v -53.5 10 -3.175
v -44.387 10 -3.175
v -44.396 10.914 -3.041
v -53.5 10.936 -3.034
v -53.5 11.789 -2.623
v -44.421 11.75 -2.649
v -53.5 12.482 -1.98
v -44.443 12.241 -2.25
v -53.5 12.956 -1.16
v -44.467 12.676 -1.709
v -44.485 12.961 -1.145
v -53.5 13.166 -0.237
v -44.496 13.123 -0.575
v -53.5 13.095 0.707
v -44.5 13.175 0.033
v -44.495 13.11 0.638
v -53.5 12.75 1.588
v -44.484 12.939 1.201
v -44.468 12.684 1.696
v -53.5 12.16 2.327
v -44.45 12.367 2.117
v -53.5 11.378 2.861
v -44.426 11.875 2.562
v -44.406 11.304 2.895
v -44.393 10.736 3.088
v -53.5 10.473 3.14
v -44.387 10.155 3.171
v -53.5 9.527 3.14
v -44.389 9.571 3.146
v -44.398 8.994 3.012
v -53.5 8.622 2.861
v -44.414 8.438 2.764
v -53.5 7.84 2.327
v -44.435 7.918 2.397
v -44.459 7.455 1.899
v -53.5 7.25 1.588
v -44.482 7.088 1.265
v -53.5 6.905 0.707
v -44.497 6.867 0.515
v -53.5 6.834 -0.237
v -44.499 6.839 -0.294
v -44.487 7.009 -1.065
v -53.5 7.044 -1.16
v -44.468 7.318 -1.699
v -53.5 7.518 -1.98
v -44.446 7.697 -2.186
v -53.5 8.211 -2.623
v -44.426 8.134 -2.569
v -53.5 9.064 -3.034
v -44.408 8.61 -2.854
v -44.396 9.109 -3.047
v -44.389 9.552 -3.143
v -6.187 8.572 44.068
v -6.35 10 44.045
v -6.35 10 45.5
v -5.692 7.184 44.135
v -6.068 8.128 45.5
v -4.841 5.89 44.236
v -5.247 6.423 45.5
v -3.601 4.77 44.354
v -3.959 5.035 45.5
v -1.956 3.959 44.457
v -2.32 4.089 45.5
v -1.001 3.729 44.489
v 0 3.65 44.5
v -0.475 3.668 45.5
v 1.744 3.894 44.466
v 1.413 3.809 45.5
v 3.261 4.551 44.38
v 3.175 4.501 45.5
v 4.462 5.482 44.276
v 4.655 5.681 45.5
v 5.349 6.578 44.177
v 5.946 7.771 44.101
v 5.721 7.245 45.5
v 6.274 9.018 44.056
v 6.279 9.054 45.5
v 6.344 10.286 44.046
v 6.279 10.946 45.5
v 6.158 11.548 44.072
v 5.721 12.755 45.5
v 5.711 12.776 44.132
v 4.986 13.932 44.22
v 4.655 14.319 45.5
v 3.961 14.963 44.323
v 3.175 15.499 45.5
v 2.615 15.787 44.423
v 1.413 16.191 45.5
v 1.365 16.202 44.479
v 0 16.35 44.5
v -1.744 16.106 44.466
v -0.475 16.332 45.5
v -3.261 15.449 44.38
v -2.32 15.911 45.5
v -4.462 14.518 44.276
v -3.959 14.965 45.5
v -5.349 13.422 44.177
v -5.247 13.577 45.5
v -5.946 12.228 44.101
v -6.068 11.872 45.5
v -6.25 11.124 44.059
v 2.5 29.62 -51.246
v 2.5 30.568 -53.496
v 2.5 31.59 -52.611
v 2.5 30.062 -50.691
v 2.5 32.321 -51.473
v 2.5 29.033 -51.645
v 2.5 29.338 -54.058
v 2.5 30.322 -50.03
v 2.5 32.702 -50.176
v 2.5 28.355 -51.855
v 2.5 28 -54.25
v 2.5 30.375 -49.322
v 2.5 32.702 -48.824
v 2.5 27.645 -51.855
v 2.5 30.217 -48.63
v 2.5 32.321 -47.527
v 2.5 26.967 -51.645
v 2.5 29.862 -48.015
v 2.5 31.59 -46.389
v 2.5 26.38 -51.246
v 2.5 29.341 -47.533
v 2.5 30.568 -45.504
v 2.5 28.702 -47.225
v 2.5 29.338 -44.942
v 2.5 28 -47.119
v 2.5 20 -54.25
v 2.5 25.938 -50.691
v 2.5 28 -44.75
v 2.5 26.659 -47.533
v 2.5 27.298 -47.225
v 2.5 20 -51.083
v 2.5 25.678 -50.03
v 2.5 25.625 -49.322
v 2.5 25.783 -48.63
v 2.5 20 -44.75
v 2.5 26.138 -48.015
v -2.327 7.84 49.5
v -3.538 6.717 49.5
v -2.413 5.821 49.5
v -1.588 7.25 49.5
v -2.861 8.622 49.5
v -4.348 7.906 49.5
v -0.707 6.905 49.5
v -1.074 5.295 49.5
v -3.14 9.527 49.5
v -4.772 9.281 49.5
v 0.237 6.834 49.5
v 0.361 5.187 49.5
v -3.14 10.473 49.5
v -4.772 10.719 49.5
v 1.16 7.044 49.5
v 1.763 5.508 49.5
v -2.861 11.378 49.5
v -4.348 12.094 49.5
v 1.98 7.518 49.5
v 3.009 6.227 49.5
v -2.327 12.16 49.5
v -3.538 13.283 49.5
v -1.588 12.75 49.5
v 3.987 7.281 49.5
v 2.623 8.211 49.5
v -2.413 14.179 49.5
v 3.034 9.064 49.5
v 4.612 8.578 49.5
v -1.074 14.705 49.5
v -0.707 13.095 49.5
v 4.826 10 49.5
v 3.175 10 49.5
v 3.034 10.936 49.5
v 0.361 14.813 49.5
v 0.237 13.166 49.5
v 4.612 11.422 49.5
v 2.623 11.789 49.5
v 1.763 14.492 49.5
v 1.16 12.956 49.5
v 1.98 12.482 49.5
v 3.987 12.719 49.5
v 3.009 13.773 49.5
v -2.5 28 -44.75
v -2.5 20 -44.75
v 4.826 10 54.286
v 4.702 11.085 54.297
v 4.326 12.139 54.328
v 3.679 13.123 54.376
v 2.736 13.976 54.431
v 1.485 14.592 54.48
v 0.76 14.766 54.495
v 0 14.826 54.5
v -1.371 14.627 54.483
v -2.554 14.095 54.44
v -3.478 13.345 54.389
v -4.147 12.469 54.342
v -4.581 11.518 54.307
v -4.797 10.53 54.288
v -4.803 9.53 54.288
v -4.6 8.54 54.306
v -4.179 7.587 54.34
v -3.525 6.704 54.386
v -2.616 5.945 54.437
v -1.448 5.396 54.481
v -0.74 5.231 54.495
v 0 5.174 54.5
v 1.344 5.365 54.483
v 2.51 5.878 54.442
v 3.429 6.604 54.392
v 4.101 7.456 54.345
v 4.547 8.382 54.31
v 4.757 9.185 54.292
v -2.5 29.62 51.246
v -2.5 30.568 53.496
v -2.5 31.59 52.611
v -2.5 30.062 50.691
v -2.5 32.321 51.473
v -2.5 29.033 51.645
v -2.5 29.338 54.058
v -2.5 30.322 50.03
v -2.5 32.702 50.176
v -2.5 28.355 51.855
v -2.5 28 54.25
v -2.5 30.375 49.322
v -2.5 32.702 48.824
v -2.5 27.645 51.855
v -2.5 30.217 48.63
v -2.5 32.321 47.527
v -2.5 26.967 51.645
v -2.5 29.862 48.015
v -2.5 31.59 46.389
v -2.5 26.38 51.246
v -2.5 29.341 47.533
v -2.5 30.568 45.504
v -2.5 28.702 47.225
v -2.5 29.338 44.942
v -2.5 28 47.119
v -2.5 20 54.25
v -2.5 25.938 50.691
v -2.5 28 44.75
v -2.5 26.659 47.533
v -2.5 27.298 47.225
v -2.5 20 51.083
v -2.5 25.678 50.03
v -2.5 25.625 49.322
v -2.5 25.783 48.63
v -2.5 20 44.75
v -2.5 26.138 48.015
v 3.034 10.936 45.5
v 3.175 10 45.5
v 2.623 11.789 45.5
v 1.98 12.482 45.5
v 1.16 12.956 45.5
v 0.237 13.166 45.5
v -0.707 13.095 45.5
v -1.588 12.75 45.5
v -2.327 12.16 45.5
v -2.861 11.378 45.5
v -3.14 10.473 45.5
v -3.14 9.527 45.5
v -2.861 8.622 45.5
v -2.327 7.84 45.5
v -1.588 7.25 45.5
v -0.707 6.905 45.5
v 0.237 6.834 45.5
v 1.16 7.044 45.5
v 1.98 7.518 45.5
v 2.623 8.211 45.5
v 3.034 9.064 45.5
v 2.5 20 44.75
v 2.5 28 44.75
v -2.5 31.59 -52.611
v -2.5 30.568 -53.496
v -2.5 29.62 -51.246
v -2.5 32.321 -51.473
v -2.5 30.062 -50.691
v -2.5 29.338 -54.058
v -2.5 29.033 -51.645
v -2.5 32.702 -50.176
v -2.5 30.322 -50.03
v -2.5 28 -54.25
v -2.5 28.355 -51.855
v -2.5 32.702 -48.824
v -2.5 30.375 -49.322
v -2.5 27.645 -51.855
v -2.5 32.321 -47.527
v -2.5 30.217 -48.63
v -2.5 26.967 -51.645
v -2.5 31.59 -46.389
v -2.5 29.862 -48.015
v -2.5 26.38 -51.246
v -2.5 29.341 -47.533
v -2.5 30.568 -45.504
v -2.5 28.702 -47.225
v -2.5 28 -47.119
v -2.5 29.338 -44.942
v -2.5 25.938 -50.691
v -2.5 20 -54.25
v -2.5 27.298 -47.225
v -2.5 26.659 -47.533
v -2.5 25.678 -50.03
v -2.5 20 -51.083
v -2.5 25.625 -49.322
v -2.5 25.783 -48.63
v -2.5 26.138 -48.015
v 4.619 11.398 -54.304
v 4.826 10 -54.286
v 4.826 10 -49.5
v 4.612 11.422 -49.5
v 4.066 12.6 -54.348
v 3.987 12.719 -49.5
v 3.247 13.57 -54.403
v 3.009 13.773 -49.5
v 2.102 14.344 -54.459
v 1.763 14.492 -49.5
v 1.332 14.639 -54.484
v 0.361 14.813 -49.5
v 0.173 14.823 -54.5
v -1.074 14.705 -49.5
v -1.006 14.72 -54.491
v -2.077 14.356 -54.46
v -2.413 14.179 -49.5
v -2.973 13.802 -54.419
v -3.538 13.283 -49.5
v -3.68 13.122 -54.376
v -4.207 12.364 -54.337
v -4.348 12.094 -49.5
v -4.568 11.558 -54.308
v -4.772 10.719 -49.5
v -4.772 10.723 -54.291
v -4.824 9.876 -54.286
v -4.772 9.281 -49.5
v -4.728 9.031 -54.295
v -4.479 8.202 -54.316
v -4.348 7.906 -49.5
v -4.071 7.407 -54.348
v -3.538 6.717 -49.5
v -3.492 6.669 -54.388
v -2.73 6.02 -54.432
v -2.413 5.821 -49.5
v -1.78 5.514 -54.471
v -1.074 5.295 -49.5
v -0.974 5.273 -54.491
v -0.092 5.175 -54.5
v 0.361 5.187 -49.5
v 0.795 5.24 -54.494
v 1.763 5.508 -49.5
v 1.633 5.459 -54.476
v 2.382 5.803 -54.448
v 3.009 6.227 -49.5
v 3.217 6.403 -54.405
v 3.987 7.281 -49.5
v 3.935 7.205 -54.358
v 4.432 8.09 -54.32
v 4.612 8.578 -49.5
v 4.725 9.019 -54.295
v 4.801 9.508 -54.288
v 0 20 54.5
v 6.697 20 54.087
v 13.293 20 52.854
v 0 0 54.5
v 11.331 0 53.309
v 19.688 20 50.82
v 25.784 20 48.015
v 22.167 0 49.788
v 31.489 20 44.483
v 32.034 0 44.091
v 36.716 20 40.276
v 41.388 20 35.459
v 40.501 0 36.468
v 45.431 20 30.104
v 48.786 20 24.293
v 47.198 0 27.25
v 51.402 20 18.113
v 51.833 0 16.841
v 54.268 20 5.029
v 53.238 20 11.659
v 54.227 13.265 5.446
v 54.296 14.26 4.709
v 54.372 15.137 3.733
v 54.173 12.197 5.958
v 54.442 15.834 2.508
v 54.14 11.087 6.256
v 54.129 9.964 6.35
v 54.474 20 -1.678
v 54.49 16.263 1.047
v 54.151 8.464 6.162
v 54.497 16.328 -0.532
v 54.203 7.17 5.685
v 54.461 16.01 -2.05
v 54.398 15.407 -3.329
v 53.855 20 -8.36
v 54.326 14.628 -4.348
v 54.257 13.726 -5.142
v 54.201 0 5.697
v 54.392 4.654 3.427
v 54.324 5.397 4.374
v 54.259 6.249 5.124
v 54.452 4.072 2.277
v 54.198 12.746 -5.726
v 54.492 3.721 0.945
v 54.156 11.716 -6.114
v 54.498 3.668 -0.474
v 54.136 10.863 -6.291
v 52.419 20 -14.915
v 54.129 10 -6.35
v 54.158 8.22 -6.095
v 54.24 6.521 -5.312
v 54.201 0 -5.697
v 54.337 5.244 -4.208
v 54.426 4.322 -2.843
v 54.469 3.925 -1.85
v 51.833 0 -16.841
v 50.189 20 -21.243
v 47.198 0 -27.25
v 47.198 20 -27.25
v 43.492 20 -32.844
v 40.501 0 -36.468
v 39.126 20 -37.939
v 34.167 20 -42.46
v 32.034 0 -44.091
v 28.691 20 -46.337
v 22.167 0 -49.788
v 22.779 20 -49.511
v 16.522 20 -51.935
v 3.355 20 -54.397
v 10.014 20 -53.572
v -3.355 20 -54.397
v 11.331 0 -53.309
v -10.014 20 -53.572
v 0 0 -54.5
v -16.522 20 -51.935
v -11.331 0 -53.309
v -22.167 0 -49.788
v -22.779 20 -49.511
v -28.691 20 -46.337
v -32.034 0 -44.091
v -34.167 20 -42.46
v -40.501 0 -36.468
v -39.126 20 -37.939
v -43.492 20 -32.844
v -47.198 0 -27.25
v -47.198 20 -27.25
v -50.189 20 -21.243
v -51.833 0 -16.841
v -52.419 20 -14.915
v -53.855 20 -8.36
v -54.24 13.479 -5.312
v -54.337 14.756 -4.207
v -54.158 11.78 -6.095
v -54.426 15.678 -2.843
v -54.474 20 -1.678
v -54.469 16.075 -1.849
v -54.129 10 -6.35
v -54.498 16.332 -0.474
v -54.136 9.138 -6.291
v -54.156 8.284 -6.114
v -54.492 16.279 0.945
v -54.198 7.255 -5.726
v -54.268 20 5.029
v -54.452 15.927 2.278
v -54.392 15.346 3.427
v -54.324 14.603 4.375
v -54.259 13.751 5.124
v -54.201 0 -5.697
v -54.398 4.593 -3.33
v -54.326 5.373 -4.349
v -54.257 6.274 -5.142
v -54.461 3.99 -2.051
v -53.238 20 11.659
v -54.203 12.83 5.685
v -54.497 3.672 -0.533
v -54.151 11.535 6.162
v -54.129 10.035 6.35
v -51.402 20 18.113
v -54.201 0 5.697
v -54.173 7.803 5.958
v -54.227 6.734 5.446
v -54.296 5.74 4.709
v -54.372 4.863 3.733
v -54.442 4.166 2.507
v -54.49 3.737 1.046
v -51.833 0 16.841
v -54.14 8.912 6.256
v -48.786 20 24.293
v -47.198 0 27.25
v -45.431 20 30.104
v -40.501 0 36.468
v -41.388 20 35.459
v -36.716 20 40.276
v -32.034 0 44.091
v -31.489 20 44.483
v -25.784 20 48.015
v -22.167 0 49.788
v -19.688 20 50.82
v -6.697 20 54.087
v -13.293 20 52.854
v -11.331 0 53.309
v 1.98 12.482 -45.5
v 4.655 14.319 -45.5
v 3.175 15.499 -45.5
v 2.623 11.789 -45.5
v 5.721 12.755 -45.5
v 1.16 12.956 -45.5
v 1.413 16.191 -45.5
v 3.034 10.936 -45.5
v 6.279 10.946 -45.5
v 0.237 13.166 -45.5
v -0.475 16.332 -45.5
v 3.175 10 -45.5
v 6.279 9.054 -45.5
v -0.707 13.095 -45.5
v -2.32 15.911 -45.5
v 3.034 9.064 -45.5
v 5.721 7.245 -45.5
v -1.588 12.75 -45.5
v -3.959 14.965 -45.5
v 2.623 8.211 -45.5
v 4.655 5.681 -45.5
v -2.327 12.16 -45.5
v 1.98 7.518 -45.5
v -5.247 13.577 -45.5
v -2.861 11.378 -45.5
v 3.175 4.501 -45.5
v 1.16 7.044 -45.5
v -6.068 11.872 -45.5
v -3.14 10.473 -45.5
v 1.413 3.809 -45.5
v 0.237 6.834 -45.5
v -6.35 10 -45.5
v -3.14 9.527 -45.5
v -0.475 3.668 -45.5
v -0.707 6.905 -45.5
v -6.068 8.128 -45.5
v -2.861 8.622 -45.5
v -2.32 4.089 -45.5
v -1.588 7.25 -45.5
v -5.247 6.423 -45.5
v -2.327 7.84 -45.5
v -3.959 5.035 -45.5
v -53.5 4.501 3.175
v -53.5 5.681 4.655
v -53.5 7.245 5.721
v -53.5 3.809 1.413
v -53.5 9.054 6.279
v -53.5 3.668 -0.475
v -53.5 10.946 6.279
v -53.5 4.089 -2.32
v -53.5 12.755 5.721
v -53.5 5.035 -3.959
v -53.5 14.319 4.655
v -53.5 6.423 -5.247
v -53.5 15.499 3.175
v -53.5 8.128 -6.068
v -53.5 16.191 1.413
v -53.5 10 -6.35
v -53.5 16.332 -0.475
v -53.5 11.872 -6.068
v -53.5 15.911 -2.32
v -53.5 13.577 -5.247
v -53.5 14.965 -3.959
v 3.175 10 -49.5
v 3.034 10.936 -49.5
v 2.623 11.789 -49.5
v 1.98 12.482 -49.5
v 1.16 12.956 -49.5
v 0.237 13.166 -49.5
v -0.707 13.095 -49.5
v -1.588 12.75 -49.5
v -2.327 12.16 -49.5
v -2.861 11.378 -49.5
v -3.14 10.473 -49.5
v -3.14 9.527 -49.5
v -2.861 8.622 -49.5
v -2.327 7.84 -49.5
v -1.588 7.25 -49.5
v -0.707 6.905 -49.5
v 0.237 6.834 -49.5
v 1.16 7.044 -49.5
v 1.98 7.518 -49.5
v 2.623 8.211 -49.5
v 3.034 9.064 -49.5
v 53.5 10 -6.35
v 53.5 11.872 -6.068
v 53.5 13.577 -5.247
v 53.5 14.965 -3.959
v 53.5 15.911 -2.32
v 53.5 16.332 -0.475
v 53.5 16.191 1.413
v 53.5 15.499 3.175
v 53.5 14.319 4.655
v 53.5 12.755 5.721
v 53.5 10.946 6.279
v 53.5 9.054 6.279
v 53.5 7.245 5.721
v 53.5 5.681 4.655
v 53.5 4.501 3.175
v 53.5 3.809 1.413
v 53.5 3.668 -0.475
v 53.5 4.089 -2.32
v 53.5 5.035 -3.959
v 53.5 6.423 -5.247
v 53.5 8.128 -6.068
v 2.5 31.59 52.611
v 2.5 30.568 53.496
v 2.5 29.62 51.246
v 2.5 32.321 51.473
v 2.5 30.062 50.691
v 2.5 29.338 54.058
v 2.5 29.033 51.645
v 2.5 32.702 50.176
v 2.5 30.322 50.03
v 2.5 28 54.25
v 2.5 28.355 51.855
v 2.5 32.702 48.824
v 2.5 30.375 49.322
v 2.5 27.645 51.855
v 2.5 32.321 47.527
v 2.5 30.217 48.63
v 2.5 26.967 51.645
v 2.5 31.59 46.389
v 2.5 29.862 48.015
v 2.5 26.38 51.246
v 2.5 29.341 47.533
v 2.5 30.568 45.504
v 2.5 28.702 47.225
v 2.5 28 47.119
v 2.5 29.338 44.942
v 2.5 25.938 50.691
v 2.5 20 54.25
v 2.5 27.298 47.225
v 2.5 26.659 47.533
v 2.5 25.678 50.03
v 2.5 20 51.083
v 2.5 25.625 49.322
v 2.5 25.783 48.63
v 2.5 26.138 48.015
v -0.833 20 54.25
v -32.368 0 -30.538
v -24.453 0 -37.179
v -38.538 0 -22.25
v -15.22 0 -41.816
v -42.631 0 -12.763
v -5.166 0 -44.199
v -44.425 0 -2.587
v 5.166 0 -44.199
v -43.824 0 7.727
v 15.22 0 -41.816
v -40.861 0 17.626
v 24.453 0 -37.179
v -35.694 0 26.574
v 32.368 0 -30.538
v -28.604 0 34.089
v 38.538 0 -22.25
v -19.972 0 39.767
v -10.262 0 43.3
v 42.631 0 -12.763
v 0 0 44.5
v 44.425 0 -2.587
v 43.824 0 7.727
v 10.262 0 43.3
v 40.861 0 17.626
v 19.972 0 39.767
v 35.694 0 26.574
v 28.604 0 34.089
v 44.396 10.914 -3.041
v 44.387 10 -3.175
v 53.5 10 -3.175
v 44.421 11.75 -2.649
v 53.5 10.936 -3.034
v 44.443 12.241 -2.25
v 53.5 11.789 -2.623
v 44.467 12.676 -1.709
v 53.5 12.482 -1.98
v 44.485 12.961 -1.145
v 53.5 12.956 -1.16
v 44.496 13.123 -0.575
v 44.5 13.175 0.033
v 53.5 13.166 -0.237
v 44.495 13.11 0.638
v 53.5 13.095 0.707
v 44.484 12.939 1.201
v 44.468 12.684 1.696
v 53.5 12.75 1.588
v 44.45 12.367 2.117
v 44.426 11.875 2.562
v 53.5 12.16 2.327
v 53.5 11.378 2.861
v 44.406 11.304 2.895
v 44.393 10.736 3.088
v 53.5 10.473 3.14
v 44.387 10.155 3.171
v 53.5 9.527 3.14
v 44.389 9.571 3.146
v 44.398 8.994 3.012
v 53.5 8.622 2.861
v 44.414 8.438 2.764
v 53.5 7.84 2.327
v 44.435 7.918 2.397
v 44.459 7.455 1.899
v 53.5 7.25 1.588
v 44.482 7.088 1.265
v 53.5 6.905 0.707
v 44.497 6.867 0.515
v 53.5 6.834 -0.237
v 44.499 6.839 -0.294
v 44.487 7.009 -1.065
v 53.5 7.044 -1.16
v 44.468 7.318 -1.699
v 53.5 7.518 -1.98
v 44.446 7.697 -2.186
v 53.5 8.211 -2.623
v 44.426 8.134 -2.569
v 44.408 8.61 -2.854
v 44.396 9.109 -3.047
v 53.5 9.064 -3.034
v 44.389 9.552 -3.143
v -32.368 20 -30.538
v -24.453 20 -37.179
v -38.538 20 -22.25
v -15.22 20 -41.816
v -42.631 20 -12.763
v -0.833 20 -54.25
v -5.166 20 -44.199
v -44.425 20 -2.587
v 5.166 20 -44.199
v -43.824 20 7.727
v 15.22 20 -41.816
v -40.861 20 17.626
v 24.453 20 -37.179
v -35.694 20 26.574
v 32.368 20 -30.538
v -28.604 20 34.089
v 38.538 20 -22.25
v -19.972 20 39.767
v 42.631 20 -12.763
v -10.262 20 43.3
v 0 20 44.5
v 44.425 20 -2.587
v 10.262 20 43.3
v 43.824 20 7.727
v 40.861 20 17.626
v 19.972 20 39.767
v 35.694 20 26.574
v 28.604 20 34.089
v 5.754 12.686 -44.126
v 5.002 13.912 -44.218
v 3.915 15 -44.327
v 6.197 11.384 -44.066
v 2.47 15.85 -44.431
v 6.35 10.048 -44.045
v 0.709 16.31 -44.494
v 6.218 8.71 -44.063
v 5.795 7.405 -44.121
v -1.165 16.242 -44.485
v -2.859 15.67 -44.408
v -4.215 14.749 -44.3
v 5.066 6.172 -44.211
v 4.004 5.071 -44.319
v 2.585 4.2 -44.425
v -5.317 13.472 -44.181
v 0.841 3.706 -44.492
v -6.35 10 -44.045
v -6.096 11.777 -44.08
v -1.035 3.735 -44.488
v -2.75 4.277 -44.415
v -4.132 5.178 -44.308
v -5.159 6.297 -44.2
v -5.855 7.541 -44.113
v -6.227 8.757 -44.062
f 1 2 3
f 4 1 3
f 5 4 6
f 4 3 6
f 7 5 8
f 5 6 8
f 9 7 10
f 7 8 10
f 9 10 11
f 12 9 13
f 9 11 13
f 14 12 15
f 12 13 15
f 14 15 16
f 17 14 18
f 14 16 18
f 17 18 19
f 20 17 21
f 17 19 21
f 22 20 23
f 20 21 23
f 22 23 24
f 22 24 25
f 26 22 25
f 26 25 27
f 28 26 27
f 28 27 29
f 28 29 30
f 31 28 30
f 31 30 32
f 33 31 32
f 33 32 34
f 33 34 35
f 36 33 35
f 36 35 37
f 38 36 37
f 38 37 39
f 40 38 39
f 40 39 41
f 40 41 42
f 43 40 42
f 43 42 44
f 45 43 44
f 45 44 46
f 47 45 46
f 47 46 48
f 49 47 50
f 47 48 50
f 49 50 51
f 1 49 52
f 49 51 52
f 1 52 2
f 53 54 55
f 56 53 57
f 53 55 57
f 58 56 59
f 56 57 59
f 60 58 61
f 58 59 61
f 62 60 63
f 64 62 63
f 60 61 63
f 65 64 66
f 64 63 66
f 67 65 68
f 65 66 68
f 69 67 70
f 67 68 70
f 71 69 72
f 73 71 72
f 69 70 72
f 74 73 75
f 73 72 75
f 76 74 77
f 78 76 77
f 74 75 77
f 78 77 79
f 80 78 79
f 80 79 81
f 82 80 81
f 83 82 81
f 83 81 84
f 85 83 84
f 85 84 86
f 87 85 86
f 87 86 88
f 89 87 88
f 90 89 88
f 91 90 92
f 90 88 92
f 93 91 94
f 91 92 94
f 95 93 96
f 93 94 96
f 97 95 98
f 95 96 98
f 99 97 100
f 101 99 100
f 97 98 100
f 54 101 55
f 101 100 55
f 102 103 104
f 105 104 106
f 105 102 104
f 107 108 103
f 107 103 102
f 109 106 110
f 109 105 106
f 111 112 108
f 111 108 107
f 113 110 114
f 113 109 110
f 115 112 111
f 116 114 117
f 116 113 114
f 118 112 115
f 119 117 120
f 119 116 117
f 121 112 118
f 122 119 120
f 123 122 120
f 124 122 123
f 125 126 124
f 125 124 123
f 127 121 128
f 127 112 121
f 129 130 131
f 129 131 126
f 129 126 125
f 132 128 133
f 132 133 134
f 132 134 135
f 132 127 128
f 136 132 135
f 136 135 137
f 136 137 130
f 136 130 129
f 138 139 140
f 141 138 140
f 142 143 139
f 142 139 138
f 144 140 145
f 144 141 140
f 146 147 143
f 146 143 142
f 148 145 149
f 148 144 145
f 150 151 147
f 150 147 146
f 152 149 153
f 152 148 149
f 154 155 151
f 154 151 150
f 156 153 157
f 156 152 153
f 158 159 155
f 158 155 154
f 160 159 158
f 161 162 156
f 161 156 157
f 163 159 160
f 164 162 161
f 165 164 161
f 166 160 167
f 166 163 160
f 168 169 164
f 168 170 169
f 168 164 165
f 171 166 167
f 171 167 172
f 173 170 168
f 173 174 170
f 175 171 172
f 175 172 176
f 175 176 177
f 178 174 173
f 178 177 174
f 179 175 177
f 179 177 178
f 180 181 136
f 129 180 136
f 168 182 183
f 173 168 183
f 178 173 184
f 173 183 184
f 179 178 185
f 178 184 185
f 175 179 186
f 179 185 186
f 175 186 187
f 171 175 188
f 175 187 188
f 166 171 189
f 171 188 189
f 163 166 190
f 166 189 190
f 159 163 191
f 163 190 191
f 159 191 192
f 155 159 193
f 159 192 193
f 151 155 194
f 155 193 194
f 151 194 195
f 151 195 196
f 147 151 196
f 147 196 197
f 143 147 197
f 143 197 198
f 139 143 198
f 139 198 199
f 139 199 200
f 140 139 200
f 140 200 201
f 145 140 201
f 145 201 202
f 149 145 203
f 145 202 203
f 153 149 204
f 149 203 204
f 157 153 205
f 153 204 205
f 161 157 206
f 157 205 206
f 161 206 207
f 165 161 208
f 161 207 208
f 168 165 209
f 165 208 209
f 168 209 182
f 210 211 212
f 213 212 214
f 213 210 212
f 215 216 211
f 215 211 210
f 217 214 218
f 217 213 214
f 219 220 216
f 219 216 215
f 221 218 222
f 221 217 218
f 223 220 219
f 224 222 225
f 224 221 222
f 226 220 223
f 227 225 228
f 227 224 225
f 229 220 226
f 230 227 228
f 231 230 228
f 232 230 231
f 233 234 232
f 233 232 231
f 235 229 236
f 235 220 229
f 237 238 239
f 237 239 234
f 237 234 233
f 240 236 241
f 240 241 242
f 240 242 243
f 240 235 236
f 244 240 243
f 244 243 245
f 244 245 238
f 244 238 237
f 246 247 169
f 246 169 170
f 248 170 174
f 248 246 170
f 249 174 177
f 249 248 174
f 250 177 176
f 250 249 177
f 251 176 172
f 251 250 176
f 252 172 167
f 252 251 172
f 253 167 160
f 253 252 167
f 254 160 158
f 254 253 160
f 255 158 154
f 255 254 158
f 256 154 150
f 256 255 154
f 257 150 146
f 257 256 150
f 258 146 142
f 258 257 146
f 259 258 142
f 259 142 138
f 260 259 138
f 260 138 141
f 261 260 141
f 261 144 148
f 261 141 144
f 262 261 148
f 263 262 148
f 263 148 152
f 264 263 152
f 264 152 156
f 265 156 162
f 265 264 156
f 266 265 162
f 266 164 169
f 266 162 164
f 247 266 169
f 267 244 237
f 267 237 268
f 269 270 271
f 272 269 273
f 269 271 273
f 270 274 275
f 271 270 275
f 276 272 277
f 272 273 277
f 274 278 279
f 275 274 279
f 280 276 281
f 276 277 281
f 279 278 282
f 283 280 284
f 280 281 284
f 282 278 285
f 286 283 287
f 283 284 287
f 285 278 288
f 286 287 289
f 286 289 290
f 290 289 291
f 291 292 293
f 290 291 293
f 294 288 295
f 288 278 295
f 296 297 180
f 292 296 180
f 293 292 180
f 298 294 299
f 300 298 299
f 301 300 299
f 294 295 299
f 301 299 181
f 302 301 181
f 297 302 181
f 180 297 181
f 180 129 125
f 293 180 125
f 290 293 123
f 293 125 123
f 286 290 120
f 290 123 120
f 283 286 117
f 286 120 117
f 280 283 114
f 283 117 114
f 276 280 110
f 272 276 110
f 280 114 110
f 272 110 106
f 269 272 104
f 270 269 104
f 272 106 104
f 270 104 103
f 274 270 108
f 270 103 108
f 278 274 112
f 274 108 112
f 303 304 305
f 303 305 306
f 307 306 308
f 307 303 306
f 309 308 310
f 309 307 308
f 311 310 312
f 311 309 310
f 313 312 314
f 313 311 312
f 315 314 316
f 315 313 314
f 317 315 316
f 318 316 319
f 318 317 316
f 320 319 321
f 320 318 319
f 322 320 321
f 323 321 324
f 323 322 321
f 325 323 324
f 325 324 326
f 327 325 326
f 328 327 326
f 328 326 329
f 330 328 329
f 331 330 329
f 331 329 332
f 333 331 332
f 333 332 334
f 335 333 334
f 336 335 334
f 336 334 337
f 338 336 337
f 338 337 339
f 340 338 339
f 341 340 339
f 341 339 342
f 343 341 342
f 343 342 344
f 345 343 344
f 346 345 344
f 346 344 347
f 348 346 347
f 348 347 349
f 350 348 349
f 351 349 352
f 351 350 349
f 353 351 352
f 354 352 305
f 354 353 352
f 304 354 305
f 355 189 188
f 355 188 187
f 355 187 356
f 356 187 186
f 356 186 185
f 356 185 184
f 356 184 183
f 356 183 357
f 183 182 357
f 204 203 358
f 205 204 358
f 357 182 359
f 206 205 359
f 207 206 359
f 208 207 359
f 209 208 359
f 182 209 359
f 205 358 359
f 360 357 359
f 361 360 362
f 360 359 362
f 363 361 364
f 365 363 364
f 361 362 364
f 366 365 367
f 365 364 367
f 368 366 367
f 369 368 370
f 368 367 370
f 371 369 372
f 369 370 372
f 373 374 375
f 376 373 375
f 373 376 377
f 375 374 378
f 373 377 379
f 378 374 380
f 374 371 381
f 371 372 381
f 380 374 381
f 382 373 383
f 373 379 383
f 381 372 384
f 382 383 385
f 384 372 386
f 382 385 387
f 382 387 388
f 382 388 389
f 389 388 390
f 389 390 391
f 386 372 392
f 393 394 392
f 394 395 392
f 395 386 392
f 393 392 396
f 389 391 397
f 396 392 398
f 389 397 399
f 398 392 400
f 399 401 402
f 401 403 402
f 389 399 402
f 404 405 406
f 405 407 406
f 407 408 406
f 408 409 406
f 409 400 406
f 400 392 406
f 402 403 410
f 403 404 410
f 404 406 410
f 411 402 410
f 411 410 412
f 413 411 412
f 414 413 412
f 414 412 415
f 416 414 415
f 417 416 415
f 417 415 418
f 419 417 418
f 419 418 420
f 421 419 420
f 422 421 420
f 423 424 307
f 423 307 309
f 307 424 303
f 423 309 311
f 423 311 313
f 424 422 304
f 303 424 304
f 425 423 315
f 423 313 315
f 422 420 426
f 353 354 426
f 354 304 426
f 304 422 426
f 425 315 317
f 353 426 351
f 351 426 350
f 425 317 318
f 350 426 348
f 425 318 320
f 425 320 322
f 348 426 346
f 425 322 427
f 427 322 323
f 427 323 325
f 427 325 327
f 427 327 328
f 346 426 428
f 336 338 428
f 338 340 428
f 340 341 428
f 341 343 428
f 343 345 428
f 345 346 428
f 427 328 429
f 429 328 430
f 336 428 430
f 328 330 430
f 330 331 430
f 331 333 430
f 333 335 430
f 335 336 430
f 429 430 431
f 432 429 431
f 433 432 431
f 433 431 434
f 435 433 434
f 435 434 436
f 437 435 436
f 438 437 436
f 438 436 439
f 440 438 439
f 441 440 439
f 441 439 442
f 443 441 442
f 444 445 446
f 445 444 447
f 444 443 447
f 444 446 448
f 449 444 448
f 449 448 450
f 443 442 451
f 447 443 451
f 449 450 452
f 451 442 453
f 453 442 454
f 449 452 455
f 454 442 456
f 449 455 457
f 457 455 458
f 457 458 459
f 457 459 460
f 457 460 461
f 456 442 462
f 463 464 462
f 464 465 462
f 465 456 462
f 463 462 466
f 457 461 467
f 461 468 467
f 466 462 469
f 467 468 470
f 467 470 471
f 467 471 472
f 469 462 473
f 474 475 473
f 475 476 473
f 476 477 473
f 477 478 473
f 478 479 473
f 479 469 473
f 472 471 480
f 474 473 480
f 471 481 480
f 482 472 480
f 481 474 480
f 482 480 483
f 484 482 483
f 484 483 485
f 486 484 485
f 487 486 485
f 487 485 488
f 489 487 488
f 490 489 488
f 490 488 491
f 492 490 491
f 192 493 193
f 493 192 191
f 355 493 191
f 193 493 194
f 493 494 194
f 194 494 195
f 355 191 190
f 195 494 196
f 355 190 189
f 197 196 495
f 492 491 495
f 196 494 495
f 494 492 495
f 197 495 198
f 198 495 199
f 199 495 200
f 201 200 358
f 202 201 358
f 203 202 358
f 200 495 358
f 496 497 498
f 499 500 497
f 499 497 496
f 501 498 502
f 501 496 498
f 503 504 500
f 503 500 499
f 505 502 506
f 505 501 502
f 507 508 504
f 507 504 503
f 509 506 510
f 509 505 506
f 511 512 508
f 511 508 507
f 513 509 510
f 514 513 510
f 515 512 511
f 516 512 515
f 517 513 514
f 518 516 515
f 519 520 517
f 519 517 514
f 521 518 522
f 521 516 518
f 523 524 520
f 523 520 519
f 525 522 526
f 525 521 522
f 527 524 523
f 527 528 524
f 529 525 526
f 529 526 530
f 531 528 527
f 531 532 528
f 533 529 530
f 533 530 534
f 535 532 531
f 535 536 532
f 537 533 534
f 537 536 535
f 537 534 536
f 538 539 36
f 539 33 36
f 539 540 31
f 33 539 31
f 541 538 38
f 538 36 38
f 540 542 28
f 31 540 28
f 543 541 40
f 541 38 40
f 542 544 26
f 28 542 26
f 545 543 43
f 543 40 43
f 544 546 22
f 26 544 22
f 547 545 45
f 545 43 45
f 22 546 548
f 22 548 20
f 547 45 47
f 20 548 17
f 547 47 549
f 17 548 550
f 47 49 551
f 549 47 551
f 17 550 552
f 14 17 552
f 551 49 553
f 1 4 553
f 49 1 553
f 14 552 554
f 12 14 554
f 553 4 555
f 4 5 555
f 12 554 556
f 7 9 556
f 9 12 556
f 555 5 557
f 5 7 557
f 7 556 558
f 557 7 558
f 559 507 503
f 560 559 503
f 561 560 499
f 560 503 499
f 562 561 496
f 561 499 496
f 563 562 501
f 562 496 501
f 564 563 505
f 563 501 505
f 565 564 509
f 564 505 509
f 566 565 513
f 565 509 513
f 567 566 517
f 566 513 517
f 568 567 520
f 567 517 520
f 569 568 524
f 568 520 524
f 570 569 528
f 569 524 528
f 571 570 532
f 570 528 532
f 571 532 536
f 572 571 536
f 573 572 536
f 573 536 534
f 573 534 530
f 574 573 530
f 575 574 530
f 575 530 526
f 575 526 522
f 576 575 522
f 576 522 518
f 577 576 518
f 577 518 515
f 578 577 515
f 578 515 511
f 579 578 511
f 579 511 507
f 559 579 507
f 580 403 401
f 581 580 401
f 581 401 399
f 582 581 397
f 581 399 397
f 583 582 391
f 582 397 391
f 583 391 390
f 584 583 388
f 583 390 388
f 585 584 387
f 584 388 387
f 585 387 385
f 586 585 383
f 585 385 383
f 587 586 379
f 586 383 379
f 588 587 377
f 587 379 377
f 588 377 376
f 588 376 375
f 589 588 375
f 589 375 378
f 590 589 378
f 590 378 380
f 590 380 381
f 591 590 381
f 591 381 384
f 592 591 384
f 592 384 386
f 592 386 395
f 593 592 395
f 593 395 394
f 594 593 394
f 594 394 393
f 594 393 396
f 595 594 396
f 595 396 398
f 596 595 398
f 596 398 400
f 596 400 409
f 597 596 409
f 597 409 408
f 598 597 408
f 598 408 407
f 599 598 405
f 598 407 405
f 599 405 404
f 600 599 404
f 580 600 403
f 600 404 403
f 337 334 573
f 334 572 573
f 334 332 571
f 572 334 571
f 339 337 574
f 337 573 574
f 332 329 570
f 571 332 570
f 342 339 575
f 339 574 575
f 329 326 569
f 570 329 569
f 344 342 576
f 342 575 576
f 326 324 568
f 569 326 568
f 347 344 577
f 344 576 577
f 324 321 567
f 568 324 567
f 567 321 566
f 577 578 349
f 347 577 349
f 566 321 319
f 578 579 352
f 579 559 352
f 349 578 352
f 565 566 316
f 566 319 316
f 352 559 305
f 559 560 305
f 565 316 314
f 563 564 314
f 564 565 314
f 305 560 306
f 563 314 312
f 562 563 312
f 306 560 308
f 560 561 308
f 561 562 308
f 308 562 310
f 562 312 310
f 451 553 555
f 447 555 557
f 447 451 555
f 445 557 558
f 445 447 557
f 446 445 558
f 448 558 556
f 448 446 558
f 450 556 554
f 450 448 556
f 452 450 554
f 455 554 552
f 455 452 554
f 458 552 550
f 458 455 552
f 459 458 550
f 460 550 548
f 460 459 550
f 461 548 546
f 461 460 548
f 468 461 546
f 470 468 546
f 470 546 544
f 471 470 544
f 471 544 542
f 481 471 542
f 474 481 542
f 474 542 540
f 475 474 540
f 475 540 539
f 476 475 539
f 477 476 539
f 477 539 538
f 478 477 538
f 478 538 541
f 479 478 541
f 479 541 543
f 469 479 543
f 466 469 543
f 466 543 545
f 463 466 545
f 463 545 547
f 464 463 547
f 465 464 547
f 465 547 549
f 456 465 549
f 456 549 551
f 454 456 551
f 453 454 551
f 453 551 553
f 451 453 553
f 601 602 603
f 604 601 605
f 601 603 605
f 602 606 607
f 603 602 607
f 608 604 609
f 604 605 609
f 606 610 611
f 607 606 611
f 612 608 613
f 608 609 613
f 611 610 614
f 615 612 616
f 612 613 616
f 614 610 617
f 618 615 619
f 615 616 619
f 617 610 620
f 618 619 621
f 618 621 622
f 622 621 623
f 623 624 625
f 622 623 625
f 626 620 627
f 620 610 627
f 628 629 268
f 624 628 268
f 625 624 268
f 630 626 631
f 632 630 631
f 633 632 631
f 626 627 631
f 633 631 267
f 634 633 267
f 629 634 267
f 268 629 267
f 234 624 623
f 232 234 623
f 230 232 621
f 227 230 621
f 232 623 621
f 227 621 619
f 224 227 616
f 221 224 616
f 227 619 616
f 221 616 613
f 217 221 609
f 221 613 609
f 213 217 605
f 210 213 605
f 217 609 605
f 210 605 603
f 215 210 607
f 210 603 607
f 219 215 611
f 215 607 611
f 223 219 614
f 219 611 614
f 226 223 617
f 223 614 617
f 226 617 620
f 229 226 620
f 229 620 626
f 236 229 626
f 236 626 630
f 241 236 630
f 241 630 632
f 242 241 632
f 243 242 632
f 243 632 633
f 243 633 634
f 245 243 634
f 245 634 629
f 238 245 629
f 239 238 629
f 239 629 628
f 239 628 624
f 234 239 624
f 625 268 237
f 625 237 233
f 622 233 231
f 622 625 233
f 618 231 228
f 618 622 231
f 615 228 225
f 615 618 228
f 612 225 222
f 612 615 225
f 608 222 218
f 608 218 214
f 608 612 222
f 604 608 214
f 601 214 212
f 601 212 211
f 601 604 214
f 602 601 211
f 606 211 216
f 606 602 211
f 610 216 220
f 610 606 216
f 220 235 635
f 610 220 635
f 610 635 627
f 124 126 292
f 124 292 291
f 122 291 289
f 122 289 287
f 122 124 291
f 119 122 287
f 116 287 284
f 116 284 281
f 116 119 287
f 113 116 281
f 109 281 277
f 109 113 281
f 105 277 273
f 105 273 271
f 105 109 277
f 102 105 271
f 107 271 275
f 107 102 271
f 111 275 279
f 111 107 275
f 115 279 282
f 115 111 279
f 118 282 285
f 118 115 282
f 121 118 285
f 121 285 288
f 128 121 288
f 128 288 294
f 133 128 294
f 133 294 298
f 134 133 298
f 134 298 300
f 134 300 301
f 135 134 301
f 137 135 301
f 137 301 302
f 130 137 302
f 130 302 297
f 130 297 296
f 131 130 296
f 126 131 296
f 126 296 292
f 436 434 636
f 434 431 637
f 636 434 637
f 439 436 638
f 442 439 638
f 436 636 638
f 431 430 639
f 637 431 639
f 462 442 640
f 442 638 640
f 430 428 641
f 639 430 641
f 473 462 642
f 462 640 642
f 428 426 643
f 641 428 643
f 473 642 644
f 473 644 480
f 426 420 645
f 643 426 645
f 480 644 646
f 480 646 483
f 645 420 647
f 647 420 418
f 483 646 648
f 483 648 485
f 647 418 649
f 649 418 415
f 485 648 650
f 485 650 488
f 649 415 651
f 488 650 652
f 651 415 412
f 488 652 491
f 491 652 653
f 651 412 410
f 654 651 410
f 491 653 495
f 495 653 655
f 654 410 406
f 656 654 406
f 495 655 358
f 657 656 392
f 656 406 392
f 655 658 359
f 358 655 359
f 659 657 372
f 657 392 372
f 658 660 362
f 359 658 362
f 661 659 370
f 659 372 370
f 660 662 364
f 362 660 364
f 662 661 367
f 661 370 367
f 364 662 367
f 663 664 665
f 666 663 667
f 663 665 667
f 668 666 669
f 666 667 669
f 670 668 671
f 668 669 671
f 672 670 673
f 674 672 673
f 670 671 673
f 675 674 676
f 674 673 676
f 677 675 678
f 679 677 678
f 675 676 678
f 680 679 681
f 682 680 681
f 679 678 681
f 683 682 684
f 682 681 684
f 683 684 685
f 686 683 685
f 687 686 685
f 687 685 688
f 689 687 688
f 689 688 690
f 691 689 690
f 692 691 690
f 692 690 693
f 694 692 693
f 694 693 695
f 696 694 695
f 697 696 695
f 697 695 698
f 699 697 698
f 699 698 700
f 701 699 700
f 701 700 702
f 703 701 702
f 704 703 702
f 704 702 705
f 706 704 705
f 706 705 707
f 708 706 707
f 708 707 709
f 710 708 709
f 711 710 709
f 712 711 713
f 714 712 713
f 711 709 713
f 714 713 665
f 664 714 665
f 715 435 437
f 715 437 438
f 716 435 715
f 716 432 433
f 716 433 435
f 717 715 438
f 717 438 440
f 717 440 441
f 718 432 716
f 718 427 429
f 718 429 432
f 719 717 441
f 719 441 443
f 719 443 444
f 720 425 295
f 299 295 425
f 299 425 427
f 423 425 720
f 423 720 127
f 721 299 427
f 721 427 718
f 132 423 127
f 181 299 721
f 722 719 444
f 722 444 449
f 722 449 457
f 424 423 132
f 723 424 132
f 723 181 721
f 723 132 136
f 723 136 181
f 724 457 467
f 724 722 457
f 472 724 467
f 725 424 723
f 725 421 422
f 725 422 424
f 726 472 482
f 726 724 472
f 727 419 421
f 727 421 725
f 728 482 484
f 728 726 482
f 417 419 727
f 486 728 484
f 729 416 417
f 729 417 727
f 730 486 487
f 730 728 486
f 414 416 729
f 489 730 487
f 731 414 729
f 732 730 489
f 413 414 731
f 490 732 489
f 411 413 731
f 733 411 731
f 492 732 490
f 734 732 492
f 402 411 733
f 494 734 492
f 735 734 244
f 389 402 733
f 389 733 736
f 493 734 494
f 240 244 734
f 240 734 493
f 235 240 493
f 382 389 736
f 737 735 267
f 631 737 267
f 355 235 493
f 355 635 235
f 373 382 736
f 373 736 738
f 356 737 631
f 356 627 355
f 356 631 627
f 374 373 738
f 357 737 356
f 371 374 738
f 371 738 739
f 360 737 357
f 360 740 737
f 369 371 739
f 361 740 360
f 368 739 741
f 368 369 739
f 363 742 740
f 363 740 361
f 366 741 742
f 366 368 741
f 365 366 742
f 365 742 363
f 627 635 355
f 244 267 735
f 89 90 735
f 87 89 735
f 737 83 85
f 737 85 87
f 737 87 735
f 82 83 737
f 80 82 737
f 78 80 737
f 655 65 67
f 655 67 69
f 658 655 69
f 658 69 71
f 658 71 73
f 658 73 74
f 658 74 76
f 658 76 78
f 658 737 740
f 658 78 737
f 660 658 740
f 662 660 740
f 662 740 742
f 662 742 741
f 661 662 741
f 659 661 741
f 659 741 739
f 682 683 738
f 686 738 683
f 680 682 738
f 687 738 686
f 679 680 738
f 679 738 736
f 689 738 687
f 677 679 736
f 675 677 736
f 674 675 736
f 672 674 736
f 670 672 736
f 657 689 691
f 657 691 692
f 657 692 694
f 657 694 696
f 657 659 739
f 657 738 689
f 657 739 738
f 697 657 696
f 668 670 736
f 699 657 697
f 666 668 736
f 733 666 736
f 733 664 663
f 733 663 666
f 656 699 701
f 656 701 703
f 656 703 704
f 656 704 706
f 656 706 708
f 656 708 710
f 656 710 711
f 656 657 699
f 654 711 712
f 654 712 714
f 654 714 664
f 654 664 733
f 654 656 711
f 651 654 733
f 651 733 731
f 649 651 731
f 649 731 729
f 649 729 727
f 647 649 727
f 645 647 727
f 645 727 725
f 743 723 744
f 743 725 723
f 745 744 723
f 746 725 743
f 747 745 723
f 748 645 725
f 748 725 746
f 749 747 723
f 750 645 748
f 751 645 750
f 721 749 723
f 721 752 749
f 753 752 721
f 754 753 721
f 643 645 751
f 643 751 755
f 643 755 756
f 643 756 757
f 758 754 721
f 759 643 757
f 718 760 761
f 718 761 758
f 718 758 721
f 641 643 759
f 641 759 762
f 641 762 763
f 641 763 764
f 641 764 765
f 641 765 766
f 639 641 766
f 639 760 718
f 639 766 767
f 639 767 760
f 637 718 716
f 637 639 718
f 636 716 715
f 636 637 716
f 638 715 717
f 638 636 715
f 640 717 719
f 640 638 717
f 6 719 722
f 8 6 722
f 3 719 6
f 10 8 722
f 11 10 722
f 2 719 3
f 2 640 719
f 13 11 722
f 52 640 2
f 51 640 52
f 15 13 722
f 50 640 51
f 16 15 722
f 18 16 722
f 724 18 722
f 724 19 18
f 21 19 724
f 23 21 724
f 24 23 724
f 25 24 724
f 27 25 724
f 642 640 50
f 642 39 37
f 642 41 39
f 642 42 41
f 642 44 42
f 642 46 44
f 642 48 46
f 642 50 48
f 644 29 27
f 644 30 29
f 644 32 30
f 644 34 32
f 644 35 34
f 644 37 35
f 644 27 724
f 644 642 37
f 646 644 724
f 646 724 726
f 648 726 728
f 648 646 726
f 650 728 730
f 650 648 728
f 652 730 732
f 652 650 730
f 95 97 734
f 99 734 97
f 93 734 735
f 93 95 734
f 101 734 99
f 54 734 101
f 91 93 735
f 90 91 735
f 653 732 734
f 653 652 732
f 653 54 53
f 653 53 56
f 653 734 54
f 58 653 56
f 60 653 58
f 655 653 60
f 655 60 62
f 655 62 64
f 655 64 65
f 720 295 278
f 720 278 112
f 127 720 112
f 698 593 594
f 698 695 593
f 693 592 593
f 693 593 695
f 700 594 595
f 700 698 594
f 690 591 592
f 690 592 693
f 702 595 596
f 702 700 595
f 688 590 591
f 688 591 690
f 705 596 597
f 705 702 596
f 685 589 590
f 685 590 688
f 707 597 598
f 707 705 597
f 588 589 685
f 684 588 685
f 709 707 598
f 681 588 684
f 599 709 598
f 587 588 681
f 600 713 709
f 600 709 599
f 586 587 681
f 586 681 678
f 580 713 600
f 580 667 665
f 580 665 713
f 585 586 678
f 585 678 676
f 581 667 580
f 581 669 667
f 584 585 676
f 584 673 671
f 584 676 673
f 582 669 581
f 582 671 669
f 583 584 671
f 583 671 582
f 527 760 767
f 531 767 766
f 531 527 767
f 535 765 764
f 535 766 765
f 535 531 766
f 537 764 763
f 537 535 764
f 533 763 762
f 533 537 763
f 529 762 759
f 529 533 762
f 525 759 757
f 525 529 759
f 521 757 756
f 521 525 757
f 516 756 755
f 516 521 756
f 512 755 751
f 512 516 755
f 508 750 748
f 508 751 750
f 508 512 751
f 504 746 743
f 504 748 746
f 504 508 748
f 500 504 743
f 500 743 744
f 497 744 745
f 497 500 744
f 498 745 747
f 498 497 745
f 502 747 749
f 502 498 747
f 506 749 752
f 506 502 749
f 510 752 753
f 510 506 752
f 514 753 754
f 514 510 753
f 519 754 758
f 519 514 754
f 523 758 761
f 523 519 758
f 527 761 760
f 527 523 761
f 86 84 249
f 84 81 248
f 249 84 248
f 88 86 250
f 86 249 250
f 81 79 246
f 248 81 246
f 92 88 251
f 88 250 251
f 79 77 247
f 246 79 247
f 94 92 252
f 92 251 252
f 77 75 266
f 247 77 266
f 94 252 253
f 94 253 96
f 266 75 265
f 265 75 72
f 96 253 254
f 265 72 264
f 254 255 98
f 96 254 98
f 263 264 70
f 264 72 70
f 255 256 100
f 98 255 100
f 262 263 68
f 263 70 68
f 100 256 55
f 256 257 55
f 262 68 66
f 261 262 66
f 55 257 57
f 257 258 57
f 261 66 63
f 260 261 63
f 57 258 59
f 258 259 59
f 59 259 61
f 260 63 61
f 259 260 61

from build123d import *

# Parameters (mm, degrees)
SKETCH1_R               = 54.5
SKETCH1_R_2             = 44.5
BOSS_EXTRUDE1_DEPTH     = 20
CUT_EXTRUDE1_REACH      = 81.627
CUT_EXTRUDE1_END_RADIUS = 54.5
SKETCH2_R               = 3.175
CUT_EXTRUDE2_REACH      = 81.627
CUT_EXTRUDE2_END_RADIUS = 54.5
SKETCH2_2_R             = 3.175
SKETCH3_W               = 5
SKETCH3_H               = 9.5
BOSS_EXTRUDE2_DEPTH     = 13
CUT_EXTRUDE3_REACH      = 87.488
CUT_EXTRUDE4_REACH      = 87.392
SKETCH5_R               = 2.38125
SKETCH6_R               = 3.175
CUT_EXTRUDE5_DEPTH      = 180
SKETCH8_R               = 4.826
CUT_EXTRUDE6_DEPTH      = 5
SKETCH9_R               = 6.35
CUT_EXTRUDE7_DEPTH      = 1
SKETCH10_R              = 6.35
CUT_EXTRUDE9_DEPTH      = 1


with BuildPart() as part:
    # Sketch1 → Boss-Extrude1 (new body)
    with BuildSketch(Plane(origin=(0, 0, 0), x_dir=(1, 0, 0), z_dir=(0, 1, 0))):
        with Locations(Location((0, 0, 0), (0, 0, 270))):
            Circle(SKETCH1_R)
        with Locations(Location((0, 0, 0), (0, 0, 270))):
            Circle(SKETCH1_R_2, mode=Mode.SUBTRACT)
    extrude(amount=BOSS_EXTRUDE1_DEPTH)

    # Cut-Extrude1: up to this cylinder (the profile starts inside it)
    cut_extrude1_end = Plane(origin=(0, 10, 0), z_dir=(0, -1, 0)) * Cylinder(CUT_EXTRUDE1_END_RADIUS, 273.254, mode=Mode.PRIVATE)
    # Sketch2 → Cut-Extrude1 (cut, up to the surface)
    with BuildSketch(Plane.XY, mode=Mode.PRIVATE) as cut_extrude1_sk1:
        with Locations((0, 10)):
            Circle(SKETCH2_R)
    cut_extrude1_tool1 = extrude(cut_extrude1_sk1.sketch, amount=-CUT_EXTRUDE1_REACH, mode=Mode.PRIVATE) & cut_extrude1_end
    add(cut_extrude1_tool1.solids().sort_by_distance((0, 10, 0))[0], mode=Mode.SUBTRACT)

    # Cut-Extrude2: up to this cylinder (the profile starts inside it)
    cut_extrude2_end = Plane(origin=(0, 10, 0), z_dir=(0, -1, 0)) * Cylinder(CUT_EXTRUDE2_END_RADIUS, 273.254, mode=Mode.PRIVATE)
    # Sketch2_2 → Cut-Extrude2 (cut, up to the surface)
    with BuildSketch(Plane.XY, mode=Mode.PRIVATE) as cut_extrude2_sk1:
        with Locations((0, 10)):
            Circle(SKETCH2_2_R)
    cut_extrude2_tool1 = extrude(cut_extrude2_sk1.sketch, amount=CUT_EXTRUDE2_REACH, mode=Mode.PRIVATE) & cut_extrude2_end
    add(cut_extrude2_tool1.solids().sort_by_distance((0, 10, 0))[0], mode=Mode.SUBTRACT)

    # Sketch3 → Boss-Extrude2 (add)
    with BuildSketch(Plane(origin=(0, 20, 0), x_dir=(1, 0, 0), z_dir=(0, 1, 0))):
        with Locations((0, -49.5)):
            Rectangle(SKETCH3_W, SKETCH3_H)
    boss_extrude2 = extrude(amount=BOSS_EXTRUDE2_DEPTH)

    # Sketch4 → Cut-Extrude3 (cut, up to next)
    with BuildSketch(Plane(origin=(2.5, 0, 0), x_dir=(0, 0, -1), z_dir=(1, 0, 0)), mode=Mode.PRIVATE) as cut_extrude3_sk1:
        with BuildLine():
            Line((-54.25, 28), (-54.25, 33))
            Line((-54.25, 33), (-44.75, 33))
            Line((-44.75, 33), (-44.75, 28))
            ThreePointArc((-44.75, 28), (-49.5, 32.75), (-54.25, 28))
        make_face()
    cut_extrude3_tool1 = extrude(cut_extrude3_sk1.sketch, amount=-CUT_EXTRUDE3_REACH, mode=Mode.PRIVATE) & part.part
    cut_extrude3 = cut_extrude3_tool1.solids().sort_by_distance((2.5, 32.857355, 49.5))[0]
    add(cut_extrude3, mode=Mode.SUBTRACT)

    # Sketch5 → Cut-Extrude4 (cut, up to next)
    with BuildSketch(Plane(origin=(2.5, 0, 0), x_dir=(0, 0, -1), z_dir=(1, 0, 0)), mode=Mode.PRIVATE) as cut_extrude4_sk1:
        with Locations((-49.5, 28)):
            Circle(SKETCH5_R)
    cut_extrude4_tool1 = extrude(cut_extrude4_sk1.sketch, amount=-CUT_EXTRUDE4_REACH, mode=Mode.PRIVATE) & part.part
    cut_extrude4 = cut_extrude4_tool1.solids().sort_by_distance((2.5, 28, 49.5))[0]
    add(cut_extrude4, mode=Mode.SUBTRACT)

    # Mirror1: Boss-Extrude2, Cut-Extrude3, Cut-Extrude4 across plane
    add(boss_extrude2.mirror(Plane.XY))
    add(cut_extrude3.mirror(Plane.XY), mode=Mode.SUBTRACT)
    add(cut_extrude4.mirror(Plane.XY), mode=Mode.SUBTRACT)

    # Sketch6 → Cut-Extrude5 (cut)
    with BuildSketch(Plane(origin=(54.5, 0, 0), x_dir=(0, 0, -1), z_dir=(1, 0, 0))):
        with Locations((0, 10)):
            Circle(SKETCH6_R)
    extrude(amount=-CUT_EXTRUDE5_DEPTH, mode=Mode.SUBTRACT)

    # Sketch8 → Cut-Extrude6 (cut)
    with BuildSketch(Plane.XY.offset(54.5)):
        with Locations((0, 10)):
            Circle(SKETCH8_R)
    cut_extrude6 = extrude(amount=-CUT_EXTRUDE6_DEPTH, mode=Mode.SUBTRACT)

    # Mirror2: Cut-Extrude6 across plane
    add(cut_extrude6.mirror(Plane.XY), mode=Mode.SUBTRACT)

    # Sketch9 → Cut-Extrude7 (cut)
    with BuildSketch(Plane(origin=(54.5, 0, 0), x_dir=(0, 0, -1), z_dir=(1, 0, 0))):
        with Locations((0, 10)):
            Circle(SKETCH9_R)
    cut_extrude7 = extrude(amount=-CUT_EXTRUDE7_DEPTH, mode=Mode.SUBTRACT)

    # Mirror3: Cut-Extrude7 across plane
    add(cut_extrude7.mirror(Plane(origin=(0, 0, 0), x_dir=(0, 0, 1), z_dir=(1, 0, 0))), mode=Mode.SUBTRACT)

    # Sketch10 → Cut-Extrude9 (cut, symmetric)
    with BuildSketch(Plane.XY.offset(44.5)):
        with Locations(Location((0, 10, 0), (0, 0, 180))):
            Circle(SKETCH10_R)
    cut_extrude9 = extrude(amount=CUT_EXTRUDE9_DEPTH, both=True, mode=Mode.SUBTRACT)

    # Mirror4: Cut-Extrude9 across plane
    add(cut_extrude9.mirror(Plane.XY), mode=Mode.SUBTRACT)


solid = part.part
